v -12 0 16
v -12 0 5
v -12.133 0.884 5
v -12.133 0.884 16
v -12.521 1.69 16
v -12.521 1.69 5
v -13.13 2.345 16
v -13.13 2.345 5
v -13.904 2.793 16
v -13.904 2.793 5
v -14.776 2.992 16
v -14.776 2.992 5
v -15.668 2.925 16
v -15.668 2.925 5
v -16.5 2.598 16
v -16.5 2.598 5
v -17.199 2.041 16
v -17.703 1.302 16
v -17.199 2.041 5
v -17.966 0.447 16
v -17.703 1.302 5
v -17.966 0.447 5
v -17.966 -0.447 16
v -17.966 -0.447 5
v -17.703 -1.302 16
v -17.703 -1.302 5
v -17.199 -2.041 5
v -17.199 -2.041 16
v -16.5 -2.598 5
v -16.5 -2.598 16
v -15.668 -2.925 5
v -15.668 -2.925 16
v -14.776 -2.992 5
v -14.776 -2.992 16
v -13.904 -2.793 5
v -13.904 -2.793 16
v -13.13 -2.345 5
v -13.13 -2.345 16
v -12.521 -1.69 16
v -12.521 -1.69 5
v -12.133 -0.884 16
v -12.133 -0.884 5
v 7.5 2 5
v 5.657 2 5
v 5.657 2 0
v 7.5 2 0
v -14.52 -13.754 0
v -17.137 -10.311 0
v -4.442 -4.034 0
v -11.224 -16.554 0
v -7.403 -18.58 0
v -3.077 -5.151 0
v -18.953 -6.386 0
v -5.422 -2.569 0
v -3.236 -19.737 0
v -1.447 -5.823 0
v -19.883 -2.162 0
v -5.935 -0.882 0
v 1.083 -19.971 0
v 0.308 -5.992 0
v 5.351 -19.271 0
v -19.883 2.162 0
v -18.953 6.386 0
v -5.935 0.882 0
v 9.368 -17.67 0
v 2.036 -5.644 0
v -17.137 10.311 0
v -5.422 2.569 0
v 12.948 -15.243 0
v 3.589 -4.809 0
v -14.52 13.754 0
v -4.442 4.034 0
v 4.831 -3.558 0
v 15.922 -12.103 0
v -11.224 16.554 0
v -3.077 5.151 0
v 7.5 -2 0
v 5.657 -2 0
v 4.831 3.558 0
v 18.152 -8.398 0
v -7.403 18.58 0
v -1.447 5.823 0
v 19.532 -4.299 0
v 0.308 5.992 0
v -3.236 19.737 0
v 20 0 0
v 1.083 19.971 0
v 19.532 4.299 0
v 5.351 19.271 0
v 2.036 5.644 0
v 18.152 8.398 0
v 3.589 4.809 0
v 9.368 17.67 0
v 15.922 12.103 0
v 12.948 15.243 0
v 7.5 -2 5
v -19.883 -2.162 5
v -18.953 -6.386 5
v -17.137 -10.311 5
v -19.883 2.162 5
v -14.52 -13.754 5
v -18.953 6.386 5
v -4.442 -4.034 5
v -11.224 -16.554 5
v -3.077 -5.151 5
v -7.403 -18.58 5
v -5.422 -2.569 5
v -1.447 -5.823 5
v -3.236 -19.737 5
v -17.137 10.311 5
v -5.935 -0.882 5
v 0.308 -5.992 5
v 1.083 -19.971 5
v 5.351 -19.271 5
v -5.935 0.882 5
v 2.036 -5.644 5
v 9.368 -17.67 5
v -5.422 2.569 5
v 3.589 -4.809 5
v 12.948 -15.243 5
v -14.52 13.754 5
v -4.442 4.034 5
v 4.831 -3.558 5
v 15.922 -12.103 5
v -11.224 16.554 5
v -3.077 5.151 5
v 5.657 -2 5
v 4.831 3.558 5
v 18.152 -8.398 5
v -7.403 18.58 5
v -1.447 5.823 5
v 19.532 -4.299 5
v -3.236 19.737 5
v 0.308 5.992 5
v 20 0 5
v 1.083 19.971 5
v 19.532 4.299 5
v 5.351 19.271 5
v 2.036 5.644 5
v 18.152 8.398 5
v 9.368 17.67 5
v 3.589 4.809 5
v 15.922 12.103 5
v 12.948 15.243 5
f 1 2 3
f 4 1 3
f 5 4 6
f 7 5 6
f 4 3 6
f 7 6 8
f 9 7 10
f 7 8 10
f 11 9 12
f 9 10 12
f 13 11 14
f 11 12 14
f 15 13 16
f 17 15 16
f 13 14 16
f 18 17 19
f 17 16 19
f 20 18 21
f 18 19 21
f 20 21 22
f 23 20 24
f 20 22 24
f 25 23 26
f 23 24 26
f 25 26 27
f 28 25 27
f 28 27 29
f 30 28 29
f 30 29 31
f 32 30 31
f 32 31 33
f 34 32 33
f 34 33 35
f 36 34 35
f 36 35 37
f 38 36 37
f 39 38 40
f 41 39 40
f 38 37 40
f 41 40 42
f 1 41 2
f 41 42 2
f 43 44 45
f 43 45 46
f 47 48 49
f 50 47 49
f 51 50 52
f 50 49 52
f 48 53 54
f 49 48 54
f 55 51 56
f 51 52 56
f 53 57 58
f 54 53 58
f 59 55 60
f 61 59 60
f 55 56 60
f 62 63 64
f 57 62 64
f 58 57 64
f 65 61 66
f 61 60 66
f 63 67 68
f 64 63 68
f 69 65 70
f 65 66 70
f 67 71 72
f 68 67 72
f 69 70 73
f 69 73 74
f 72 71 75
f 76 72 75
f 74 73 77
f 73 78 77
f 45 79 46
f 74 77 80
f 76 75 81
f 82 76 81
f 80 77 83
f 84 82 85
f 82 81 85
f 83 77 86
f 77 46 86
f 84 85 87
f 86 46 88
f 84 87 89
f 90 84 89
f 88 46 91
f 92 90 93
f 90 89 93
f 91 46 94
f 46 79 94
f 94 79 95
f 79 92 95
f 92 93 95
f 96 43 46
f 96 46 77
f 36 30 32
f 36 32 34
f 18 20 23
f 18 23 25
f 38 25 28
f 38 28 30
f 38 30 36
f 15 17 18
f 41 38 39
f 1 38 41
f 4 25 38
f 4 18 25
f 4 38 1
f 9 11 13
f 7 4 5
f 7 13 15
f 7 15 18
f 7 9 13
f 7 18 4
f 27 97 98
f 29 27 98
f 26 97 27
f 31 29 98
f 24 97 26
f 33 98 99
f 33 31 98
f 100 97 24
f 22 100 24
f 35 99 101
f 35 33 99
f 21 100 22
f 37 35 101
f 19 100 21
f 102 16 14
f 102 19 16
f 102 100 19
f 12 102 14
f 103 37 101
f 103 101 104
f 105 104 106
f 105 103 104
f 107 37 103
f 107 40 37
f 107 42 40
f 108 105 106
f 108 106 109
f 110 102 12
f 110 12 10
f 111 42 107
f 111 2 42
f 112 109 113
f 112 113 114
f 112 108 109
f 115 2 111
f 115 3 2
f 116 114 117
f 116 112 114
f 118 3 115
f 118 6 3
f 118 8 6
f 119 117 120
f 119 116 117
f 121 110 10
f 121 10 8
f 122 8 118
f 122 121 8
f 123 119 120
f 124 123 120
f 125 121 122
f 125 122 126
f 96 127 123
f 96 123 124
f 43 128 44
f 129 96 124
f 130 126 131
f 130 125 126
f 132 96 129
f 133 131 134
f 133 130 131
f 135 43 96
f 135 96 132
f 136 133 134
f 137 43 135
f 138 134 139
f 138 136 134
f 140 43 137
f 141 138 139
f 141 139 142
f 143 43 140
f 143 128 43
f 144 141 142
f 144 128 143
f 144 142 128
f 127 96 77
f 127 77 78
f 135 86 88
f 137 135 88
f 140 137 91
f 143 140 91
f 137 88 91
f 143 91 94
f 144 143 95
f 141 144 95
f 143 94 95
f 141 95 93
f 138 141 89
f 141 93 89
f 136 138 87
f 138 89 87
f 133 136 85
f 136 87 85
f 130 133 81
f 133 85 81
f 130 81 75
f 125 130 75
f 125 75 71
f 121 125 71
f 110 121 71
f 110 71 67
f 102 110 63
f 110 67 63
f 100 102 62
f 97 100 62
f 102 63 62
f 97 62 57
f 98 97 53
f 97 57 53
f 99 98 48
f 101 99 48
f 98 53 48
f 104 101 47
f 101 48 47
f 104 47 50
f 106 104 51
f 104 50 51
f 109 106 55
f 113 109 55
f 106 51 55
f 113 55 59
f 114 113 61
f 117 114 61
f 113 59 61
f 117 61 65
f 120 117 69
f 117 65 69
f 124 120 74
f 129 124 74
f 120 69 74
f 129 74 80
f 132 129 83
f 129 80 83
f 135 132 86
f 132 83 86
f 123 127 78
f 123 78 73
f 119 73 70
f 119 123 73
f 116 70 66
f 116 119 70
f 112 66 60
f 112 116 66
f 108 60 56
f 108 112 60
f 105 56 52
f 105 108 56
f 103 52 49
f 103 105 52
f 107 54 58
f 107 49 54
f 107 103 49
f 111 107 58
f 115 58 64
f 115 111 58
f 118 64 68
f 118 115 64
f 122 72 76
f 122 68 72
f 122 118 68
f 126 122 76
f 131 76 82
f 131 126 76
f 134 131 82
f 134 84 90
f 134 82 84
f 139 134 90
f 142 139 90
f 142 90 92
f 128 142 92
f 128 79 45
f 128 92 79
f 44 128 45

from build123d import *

# Parameters (mm, degrees)
SKETCH1_R           = 20
BOSS_EXTRUDE1_DEPTH = 5
SKETCH3_R           = 3
BOSS_EXTRUDE2_DEPTH = 11
CUT_EXTRUDE1_DEPTH  = 6


with BuildPart() as part:
    # Sketch1 → Boss-Extrude1 (new body)
    with BuildSketch(Plane.XY):
        Circle(SKETCH1_R)
    extrude(amount=BOSS_EXTRUDE1_DEPTH)

    # Sketch3 → Boss-Extrude2 (add)
    with BuildSketch(Plane.XY.offset(5)):
        with Locations((-15, 0)):
            Circle(SKETCH3_R)
    extrude(amount=BOSS_EXTRUDE2_DEPTH)

    # Sketch5 → Cut-Extrude1 (cut, through all)
    with BuildSketch(Plane.XY.offset(5)):
        with BuildLine():
            Line((5.656854249, 2), (7.5, 2))
            Line((7.5, 2), (7.5, -2))
            Line((7.5, -2), (5.656854249, -2))
            ThreePointArc((5.656854249, -2), (-6, 0), (5.656854249, 2))
        make_face()
    extrude(amount=-CUT_EXTRUDE1_DEPTH, mode=Mode.SUBTRACT)


solid = part.part
